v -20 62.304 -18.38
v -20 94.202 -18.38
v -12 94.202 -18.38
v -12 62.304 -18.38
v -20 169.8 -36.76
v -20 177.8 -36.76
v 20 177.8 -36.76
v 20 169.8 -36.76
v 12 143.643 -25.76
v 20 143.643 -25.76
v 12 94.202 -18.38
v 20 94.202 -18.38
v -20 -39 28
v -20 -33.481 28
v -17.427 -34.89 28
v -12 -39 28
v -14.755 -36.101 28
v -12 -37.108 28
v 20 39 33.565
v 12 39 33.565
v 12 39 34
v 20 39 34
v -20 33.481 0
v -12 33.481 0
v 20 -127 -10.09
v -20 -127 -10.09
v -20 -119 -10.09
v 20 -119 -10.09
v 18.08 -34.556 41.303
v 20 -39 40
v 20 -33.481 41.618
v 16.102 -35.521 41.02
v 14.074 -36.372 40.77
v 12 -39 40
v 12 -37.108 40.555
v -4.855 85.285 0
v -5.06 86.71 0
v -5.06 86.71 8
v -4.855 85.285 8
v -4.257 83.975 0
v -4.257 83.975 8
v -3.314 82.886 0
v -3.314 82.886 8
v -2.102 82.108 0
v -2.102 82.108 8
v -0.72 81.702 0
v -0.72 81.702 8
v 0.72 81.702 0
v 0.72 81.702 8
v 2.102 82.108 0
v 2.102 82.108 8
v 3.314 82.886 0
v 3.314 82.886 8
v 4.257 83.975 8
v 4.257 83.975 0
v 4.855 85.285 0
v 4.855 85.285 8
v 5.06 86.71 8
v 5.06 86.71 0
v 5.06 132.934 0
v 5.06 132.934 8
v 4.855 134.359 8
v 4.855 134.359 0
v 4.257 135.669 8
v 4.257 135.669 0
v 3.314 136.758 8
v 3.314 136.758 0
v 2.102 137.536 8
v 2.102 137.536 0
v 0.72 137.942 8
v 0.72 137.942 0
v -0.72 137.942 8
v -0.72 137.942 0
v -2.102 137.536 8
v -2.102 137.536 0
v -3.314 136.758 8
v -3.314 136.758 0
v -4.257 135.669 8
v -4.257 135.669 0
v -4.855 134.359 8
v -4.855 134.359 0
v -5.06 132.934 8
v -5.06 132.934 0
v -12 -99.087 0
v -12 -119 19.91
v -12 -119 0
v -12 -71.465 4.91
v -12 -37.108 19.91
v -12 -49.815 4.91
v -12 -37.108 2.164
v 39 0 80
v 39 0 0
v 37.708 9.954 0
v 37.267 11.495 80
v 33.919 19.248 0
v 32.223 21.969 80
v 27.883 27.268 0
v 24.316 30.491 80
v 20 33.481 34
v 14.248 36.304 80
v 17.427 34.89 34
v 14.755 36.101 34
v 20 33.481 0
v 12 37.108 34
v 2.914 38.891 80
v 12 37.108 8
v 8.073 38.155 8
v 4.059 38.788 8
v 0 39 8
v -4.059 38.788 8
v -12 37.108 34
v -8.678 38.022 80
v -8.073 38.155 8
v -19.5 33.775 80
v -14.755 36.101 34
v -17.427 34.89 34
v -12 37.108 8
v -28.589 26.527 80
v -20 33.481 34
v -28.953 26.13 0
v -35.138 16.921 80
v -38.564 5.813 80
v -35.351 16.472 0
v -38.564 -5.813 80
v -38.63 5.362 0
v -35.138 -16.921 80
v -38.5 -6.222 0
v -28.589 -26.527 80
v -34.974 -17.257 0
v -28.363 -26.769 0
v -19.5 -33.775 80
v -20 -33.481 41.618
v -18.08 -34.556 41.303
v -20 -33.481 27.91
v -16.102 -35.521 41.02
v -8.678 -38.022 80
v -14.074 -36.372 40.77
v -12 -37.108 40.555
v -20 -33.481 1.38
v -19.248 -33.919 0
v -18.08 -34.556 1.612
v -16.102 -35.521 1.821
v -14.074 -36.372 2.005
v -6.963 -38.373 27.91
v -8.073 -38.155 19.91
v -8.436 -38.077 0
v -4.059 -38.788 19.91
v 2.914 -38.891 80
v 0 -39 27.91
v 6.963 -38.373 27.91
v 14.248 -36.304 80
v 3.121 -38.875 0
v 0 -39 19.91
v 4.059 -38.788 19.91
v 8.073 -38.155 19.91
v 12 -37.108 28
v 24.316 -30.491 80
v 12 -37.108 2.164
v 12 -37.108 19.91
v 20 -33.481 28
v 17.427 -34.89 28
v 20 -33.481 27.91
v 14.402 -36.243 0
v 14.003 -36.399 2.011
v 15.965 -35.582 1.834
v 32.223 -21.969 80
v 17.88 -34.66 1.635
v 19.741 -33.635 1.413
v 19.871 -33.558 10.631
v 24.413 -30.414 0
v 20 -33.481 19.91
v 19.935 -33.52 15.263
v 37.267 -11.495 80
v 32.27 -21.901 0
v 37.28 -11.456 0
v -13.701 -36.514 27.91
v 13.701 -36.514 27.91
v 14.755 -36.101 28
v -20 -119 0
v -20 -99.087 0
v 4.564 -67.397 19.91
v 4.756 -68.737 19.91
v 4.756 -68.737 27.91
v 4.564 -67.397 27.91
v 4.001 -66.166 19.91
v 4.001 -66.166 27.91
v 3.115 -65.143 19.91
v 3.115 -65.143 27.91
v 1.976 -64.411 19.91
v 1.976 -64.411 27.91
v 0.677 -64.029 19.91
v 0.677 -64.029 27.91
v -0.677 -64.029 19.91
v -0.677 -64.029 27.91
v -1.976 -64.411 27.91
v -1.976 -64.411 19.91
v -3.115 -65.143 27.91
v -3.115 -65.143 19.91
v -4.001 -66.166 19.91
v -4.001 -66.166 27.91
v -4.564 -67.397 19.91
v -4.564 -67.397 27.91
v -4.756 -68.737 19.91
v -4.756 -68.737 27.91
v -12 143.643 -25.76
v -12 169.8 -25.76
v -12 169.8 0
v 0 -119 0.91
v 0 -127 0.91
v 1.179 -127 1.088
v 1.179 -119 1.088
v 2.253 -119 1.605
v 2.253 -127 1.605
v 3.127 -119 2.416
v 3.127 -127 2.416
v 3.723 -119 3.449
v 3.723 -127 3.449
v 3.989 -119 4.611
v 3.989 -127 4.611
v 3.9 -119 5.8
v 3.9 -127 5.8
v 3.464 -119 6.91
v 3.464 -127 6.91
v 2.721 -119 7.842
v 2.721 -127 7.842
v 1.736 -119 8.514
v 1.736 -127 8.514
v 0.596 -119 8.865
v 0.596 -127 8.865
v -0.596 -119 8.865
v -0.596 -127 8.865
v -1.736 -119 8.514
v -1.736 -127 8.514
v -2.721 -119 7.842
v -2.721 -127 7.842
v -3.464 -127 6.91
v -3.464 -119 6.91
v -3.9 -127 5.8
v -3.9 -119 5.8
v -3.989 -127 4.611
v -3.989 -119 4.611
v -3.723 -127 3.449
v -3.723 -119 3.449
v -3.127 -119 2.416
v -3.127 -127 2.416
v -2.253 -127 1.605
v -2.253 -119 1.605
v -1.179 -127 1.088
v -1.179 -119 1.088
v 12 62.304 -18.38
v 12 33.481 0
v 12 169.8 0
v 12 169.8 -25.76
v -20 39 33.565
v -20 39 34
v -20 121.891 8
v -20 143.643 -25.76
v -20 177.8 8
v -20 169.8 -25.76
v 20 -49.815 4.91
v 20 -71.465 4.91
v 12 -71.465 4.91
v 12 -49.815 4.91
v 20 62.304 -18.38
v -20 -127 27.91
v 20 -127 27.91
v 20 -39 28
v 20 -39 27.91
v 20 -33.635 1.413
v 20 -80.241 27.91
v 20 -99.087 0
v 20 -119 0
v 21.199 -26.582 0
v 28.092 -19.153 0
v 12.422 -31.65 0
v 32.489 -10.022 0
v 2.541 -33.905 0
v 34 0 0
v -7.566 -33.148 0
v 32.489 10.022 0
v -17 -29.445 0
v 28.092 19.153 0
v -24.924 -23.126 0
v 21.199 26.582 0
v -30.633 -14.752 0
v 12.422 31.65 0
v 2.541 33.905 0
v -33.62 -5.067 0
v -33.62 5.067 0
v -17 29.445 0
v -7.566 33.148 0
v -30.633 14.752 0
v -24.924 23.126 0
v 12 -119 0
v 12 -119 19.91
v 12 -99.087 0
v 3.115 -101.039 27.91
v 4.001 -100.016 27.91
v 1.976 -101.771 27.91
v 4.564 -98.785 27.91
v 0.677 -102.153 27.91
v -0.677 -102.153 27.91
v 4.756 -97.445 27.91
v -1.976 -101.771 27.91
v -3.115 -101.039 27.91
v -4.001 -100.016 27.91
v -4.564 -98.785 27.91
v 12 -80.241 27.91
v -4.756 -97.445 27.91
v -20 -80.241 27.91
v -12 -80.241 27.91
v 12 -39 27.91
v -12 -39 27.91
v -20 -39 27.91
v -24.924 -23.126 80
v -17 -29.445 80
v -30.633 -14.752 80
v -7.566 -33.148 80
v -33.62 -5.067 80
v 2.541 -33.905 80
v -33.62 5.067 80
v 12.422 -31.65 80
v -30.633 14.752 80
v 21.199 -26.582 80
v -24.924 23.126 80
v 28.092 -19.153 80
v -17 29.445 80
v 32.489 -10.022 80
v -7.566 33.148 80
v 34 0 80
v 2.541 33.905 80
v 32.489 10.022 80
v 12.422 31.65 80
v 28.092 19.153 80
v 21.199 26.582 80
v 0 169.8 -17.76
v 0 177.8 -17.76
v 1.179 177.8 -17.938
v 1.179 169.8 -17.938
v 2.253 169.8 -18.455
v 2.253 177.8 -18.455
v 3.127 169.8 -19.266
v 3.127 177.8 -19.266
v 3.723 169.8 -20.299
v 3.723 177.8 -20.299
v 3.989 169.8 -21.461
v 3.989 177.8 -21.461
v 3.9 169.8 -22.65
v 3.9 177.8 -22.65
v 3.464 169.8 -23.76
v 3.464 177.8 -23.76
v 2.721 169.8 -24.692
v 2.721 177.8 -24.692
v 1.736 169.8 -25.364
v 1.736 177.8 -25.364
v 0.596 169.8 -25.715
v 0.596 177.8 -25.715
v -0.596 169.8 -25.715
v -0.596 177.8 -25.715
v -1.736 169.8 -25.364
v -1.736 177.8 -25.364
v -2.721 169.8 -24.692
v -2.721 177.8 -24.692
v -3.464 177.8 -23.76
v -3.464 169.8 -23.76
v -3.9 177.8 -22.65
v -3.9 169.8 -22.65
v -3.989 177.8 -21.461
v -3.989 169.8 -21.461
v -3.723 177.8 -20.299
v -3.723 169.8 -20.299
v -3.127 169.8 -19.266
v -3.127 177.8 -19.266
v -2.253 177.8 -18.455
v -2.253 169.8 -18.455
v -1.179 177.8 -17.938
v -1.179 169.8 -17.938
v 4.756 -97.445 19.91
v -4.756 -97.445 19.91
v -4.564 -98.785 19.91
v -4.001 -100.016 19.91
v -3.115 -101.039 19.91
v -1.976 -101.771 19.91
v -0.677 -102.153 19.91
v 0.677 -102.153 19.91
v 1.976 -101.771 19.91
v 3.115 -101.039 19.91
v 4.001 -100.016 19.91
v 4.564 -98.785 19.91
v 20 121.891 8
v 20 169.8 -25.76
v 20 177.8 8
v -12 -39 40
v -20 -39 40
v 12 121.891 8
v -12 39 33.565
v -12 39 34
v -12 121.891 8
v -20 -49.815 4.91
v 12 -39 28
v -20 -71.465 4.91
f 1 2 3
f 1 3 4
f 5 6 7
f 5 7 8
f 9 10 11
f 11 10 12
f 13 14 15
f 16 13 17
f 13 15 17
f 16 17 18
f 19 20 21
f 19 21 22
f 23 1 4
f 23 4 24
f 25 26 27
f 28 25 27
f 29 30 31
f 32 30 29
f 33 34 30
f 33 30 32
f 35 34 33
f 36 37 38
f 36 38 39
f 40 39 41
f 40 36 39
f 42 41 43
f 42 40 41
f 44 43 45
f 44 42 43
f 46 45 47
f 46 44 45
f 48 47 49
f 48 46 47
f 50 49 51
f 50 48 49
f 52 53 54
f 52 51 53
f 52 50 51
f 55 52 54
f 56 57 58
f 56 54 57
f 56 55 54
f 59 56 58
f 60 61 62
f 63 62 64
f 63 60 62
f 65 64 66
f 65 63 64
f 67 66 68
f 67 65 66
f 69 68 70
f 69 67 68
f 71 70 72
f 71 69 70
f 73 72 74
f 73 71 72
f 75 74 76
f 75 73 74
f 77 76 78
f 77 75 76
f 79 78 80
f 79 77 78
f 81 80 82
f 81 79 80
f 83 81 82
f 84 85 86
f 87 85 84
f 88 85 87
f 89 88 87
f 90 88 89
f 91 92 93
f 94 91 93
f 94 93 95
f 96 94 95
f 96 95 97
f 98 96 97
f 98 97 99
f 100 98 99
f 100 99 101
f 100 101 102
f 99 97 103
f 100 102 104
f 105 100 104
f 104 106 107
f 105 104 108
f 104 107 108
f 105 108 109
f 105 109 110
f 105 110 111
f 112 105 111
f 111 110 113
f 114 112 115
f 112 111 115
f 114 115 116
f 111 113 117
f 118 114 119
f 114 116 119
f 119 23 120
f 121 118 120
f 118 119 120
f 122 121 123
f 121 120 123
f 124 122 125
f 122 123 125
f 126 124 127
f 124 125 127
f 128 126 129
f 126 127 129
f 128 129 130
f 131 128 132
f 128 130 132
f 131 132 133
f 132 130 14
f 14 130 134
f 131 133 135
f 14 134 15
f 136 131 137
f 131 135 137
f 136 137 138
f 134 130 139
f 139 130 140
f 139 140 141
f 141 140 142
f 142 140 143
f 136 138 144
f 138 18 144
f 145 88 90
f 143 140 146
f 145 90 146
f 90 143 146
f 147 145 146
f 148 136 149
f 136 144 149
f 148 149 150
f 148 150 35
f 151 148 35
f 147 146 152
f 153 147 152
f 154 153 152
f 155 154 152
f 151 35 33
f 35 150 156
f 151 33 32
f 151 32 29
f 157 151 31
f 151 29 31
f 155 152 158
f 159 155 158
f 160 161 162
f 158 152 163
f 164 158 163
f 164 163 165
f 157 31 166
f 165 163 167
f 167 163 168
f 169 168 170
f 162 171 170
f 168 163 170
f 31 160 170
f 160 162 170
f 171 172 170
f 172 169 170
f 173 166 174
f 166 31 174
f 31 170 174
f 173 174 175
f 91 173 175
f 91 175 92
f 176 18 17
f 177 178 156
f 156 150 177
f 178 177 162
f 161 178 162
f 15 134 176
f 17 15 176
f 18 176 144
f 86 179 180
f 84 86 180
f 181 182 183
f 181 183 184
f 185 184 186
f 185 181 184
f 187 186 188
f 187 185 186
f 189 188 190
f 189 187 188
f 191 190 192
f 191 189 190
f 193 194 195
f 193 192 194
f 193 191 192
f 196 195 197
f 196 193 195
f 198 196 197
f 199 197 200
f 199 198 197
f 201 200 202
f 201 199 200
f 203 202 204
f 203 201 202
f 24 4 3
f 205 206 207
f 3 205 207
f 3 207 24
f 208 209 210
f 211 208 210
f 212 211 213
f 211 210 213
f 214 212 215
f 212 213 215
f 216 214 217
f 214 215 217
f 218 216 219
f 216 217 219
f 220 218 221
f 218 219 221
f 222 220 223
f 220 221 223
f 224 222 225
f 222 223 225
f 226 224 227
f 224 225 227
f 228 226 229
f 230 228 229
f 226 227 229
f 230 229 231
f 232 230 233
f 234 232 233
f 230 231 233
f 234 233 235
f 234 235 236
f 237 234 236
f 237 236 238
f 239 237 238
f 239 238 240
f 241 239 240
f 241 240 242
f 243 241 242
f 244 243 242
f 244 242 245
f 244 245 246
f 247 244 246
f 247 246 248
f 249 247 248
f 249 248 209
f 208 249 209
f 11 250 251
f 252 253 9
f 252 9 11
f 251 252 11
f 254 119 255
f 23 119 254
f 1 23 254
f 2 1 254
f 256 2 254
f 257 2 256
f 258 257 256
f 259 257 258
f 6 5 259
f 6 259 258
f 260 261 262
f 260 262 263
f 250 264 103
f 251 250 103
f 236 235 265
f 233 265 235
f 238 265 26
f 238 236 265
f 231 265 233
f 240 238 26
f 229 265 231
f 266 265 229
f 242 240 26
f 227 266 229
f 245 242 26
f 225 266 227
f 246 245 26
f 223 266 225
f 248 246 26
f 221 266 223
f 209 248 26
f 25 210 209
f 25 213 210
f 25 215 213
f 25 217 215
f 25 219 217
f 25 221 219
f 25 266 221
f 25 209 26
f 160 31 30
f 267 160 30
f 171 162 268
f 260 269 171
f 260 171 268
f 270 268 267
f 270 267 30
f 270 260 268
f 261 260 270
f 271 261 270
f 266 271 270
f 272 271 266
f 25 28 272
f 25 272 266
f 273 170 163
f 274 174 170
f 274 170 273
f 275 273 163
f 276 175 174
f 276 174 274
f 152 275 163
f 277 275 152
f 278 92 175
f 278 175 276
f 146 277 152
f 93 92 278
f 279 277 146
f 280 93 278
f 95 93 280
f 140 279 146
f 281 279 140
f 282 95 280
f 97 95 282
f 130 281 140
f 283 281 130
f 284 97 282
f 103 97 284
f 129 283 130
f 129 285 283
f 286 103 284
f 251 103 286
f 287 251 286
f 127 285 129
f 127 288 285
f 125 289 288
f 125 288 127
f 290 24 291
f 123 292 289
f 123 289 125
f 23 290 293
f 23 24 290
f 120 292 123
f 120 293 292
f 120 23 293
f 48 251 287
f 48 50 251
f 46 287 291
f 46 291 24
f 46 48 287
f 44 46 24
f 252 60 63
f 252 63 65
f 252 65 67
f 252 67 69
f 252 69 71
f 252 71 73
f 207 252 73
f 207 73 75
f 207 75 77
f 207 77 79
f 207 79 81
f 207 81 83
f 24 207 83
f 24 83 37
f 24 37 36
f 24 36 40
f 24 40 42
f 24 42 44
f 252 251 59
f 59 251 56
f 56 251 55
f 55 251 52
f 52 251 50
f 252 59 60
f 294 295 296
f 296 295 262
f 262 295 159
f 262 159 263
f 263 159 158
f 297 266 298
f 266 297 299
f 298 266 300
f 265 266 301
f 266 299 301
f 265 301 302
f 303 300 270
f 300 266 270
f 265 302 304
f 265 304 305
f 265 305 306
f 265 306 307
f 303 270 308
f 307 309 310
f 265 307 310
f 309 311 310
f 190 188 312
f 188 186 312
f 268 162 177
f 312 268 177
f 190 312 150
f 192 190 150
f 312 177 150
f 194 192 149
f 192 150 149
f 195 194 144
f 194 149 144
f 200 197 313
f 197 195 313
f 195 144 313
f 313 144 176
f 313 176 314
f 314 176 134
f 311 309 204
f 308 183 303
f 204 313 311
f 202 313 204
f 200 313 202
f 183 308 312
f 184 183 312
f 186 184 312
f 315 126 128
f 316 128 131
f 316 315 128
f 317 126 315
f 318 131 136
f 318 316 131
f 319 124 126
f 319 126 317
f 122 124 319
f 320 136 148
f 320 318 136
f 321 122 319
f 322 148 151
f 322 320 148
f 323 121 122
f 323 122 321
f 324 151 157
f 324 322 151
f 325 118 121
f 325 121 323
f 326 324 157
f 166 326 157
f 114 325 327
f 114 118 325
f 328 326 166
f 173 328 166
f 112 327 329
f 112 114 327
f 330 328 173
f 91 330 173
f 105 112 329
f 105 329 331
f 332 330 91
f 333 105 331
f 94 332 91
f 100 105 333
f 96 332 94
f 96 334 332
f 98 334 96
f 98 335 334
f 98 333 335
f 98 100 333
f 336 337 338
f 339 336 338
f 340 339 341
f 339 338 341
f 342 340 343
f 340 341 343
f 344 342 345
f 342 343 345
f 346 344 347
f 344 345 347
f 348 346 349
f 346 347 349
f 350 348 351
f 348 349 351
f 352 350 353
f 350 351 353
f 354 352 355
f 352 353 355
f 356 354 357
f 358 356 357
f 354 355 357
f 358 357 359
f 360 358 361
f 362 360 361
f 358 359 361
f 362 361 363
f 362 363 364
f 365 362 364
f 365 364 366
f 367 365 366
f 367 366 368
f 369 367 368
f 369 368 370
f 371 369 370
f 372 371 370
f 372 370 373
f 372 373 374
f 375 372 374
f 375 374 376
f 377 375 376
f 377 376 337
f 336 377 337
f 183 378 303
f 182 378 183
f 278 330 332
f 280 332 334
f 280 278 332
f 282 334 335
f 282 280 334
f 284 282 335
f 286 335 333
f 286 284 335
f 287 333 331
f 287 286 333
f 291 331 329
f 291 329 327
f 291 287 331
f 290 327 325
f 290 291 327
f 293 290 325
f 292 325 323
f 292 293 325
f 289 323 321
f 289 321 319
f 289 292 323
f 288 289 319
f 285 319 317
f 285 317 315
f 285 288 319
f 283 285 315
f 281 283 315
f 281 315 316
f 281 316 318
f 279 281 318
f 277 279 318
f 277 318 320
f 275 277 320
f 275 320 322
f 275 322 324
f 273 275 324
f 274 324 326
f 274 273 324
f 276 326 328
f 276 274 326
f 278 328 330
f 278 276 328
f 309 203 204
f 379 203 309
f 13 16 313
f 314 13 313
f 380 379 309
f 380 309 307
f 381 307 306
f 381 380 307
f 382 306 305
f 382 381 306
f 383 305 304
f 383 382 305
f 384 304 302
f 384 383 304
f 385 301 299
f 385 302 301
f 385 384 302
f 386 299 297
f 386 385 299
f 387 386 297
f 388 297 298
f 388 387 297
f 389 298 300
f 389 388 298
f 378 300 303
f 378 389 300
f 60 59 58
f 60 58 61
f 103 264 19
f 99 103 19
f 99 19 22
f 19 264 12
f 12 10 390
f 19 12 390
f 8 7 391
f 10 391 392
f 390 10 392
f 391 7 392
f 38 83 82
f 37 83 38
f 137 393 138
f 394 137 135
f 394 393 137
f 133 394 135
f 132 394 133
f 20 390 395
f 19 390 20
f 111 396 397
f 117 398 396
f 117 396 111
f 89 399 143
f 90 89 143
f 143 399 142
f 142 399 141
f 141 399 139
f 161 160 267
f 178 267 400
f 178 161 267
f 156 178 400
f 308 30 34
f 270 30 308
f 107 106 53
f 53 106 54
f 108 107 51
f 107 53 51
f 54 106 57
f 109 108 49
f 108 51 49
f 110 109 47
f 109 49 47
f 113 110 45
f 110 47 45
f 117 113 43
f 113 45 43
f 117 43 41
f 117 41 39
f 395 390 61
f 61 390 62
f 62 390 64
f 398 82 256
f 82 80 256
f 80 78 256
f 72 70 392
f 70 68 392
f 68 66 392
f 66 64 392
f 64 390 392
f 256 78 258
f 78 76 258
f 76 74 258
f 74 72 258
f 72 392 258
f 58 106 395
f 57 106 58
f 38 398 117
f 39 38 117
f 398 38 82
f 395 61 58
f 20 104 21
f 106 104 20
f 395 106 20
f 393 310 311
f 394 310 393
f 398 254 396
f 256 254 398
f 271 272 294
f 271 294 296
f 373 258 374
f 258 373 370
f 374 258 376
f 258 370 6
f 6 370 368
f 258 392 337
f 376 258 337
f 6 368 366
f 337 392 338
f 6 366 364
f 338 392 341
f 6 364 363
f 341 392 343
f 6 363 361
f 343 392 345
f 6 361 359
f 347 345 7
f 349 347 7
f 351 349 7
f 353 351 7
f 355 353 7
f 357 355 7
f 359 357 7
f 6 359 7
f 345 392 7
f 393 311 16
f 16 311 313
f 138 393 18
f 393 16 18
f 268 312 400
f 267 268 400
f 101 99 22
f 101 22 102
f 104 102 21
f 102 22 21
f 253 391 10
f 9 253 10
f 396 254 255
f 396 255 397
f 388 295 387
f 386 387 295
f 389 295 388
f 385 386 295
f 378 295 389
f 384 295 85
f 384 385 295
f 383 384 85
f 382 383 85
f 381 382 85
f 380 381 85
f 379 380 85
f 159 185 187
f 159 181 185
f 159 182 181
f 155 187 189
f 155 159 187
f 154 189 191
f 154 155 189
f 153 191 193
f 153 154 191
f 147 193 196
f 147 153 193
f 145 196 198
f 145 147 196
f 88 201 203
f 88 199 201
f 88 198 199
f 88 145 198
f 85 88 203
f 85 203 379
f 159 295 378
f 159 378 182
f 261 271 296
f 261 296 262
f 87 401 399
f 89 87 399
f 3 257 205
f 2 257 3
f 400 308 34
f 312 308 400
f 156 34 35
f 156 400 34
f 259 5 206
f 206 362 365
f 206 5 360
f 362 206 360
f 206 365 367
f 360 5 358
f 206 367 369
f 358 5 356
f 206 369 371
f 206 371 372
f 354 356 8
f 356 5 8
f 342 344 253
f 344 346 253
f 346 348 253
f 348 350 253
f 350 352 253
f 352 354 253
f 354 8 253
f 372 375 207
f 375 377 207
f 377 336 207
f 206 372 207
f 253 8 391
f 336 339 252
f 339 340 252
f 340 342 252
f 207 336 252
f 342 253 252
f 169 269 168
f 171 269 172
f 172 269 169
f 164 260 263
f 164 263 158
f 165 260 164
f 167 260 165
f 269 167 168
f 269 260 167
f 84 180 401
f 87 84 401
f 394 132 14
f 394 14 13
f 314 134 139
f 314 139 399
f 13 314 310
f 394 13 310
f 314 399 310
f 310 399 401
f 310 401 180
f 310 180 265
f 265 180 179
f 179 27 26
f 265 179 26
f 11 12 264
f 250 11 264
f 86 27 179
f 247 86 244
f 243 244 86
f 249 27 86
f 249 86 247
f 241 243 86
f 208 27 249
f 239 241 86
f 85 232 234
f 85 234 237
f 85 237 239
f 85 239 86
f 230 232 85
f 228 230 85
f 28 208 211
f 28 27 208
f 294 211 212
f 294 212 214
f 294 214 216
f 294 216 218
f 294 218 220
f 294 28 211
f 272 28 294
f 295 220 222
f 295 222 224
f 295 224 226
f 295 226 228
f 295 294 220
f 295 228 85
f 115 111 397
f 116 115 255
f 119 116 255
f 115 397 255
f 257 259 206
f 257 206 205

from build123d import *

# Parameters (mm, degrees)
SKETCH1_R            = 39
SKETCH1_R_2          = 34
BOSS_EXTRUDE1_DEPTH  = 80
BOSS_EXTRUDE2_DEPTH  = 20
BOSS_EXTRUDE3_DEPTH  = 20
BOSS_EXTRUDE4_DEPTH  = 8
BOSS_EXTRUDE5_DEPTH  = 8
CUT_EXTRUDE1_DEPTH   = 73
SKETCH13_R           = 4
CUT_EXTRUDE2_DEPTH   = 24
SKETCH14_R           = 4
CUT_EXTRUDE3_DEPTH   = 24
BOSS_EXTRUDE6_DEPTH  = 8
BOSS_EXTRUDE7_DEPTH  = 8
BOSS_EXTRUDE8_DEPTH  = 8
BOSS_EXTRUDE14_DEPTH = 8
BOSS_EXTRUDE15_DEPTH = 8
BOSS_EXTRUDE16_DEPTH = 8
BOSS_EXTRUDE17_DEPTH = 8
BOSS_EXTRUDE18_DEPTH = 26
BOSS_EXTRUDE19_REACH = 195.204


with BuildPart() as part:
    # Sketch1 → Boss-Extrude1 (new body)
    with BuildSketch(Plane.XY):
        Circle(SKETCH1_R)
        Circle(SKETCH1_R_2, mode=Mode.SUBTRACT)
    extrude(amount=BOSS_EXTRUDE1_DEPTH)



with BuildPart() as body_2:
    # Sketch3 → Boss-Extrude2 (new, symmetric)
    with BuildSketch(Plane(origin=(0, 0, 0), x_dir=(0, 0, -1), z_dir=(1, 0, 0))):
        Polygon((-8, 39), (-8, 177.8), (36.76, 177.8), (36.76, 169.8), (0, 169.8), (0, 39), align=None)
    extrude(amount=BOSS_EXTRUDE2_DEPTH, both=True)


with BuildPart() as body_3:
    # Sketch4 → Boss-Extrude3 (new, symmetric)
    with BuildSketch(Plane(origin=(0, 0, 0), x_dir=(0, 0, -1), z_dir=(1, 0, 0))):
        Polygon((-27.91, -39), (-27.91, -127), (10.09, -127), (10.09, -119), (-19.91, -119), (-19.91, -39), align=None)
    extrude(amount=BOSS_EXTRUDE3_DEPTH, both=True)


with BuildPart() as part_1:
    add(part.part)

    add(body_3.part)  # Boss-Extrude4 merges body 3
    # Sketch6 → Boss-Extrude4 (add)
    with BuildSketch(Plane(origin=(0, 0, 19.91), x_dir=(-1, 0, 0), z_dir=(0, 0, -1))):
        with BuildLine():
            ThreePointArc((20, -33.481338086), (10.373712322, -37.595027499), (0, -39))
            Line((0, -39), (20, -39))
            Line((20, -39), (20, -33.481338086))
        make_face()
        with BuildLine():
            Line((-20, -33.481338086), (-20, -39))
            Line((-20, -39), (0, -39))
            ThreePointArc((0, -39), (-10.373712322, -37.595027499), (-20, -33.481338086))
        make_face()
    extrude(amount=-BOSS_EXTRUDE4_DEPTH)


    add(body_2.part)  # Boss-Extrude5 merges body 2
    # Sketch7 → Boss-Extrude5 (add)
    with BuildSketch(Plane(origin=(0, 0, 0), x_dir=(-1, 0, 0), z_dir=(0, 0, -1))):
        with BuildLine():
            Line((0, 39), (-20, 39))
            Line((-20, 39), (-20, 33.481338086))
            ThreePointArc((-20, 33.481338086), (-10.373712322, 37.595027499), (0, 39))
        make_face()
        with BuildLine():
            Line((20, 39), (0, 39))
            ThreePointArc((0, 39), (10.373712322, 37.595027499), (20, 33.481338086))
            Line((20, 33.481338086), (20, 39))
        make_face()
    extrude(amount=-BOSS_EXTRUDE5_DEPTH)

    # Sketch12 → Cut-Extrude1 (cut)
    with BuildSketch(Plane(origin=(0, 0, 0), x_dir=(-1, 0, 0), z_dir=(0, 0, -1))):
        with BuildLine():
            Line((5.059933618, 132.933679622), (5.059933618, 86.710392146))
            ThreePointArc((5.059933618, 86.710392146), (0, 81.650458528), (-5.059933618, 86.710392146))
            Line((-5.059933618, 86.710392146), (-5.059933618, 132.933679622))
            ThreePointArc((-5.059933618, 132.933679622), (0, 137.993613239), (5.059933618, 132.933679622))
        make_face()
        with BuildLine():
            Line((4.756389645, -68.737317272), (4.756389645, -97.444530968))
            ThreePointArc((4.756389645, -97.444530968), (0, -102.200920613), (-4.756389645, -97.444530968))
            Line((-4.756389645, -97.444530968), (-4.756389645, -68.737317272))
            ThreePointArc((-4.756389645, -68.737317272), (0, -63.980927627), (4.756389645, -68.737317272))
        make_face()
    extrude(amount=-CUT_EXTRUDE1_DEPTH, mode=Mode.SUBTRACT)

    # Sketch13 → Cut-Extrude2 (cut)
    with BuildSketch(Plane(origin=(0, 177.8, 0), x_dir=(1, 0, 0), z_dir=(0, 1, 0))):
        with Locations(Location((0, 21.76, 0), (0, 0, 270))):
            Circle(SKETCH13_R)
    extrude(amount=-CUT_EXTRUDE2_DEPTH, mode=Mode.SUBTRACT)

    # Sketch14 → Cut-Extrude3 (cut)
    with BuildSketch(Plane.XZ.offset(127)):
        with Locations(Location((0, 4.91, 0), (0, 0, 270))):
            Circle(SKETCH14_R)
    extrude(amount=-CUT_EXTRUDE3_DEPTH, mode=Mode.SUBTRACT)

    # Sketch15 → Boss-Extrude6 (add)
    with BuildSketch(Plane(origin=(20, 0, 0), x_dir=(0, 0, -1), z_dir=(1, 0, 0))):
        Polygon((0, -119), (0, -99.086888853), (-4.91, -71.464610667), (-4.91, -49.814716953), (-1.4130197, -33.634678949), (-19.91, -33.481338086), (-19.91, -119), align=None)
    extrude(amount=-BOSS_EXTRUDE6_DEPTH)

    # Sketch16 → Boss-Extrude7 (add)
    with BuildSketch(Plane.ZY.offset(20)):
        Polygon((0, -119), (0, -99.086888853), (4.91, -71.464610667), (4.91, -49.814716953), (1.379878246, -33.481338086), (19.91, -33.481338086), (19.91, -119), align=None)
    extrude(amount=-BOSS_EXTRUDE7_DEPTH)

    # Sketch17 → Boss-Extrude8 (add)
    with BuildSketch(Plane(origin=(20, 0, 0), x_dir=(0, 0, -1), z_dir=(1, 0, 0))):
        Polygon((25.76, 169.8), (25.76, 143.643001818), (18.38, 94.201688411), (18.38, 62.304066859), (0, 33.481338086), (0, 169.8), align=None)
    extrude(amount=-BOSS_EXTRUDE8_DEPTH)

    # Sketch23 → Boss-Extrude14 (add)
    with BuildSketch(Plane(origin=(20, 0, 0), x_dir=(0, 0, -1), z_dir=(1, 0, 0))):
        Polygon((-8, 121.891336637), (-33.564768945, 39), (-8, 39), align=None)
        Polygon((-40, -39), (-27.91, -80.240669043), (-27.91, -39), align=None)
    extrude(amount=-BOSS_EXTRUDE14_DEPTH)

    # Sketch24 → Boss-Extrude15 (add)
    with BuildSketch(Plane.ZY.offset(20)):
        Polygon((0, 169.8), (-25.76, 169.8), (-25.76, 143.643001818), (-18.38, 94.201688411), (-18.38, 62.304066859), (0, 33.481338086), align=None)
    extrude(amount=-BOSS_EXTRUDE15_DEPTH)

    # Sketch25 → Boss-Extrude16 (add)
    with BuildSketch(Plane.ZY.offset(20)):
        Polygon((8, 39), (33.564768945, 39), (8, 121.891336637), align=None)
    extrude(amount=-BOSS_EXTRUDE16_DEPTH)

    # Sketch26 → Boss-Extrude17 (add)
    with BuildSketch(Plane.ZY.offset(20)):
        Polygon((27.91, -39), (27.91, -80.240669043), (40, -39), align=None)
    extrude(amount=-BOSS_EXTRUDE17_DEPTH)

    # Sketch28 → Boss-Extrude18 (add)
    with BuildSketch(Plane.XY.offset(8)):
        with BuildLine():
            ThreePointArc((-12, 37.107950631), (-16.102424651, 35.52058446), (-20, 33.481338086))
            Line((-20, 33.481338086), (-20, 39))
            Line((-20, 39), (-12, 39))
            Line((-12, 39), (-12, 37.107950631))
        make_face()
        with BuildLine():
            ThreePointArc((20, 33.481338086), (16.102424651, 35.52058446), (12, 37.107950631))
            Line((12, 37.107950631), (12, 39))
            Line((12, 39), (20, 39))
            Line((20, 39), (20, 33.481338086))
        make_face()
    extrude(amount=BOSS_EXTRUDE18_DEPTH)

    # Boss-Extrude19: up to this plane
    boss_extrude19_end = Plane(origin=(-12, -80.240669043, 27.91), z_dir=(0, -0.2813179552300577, 0.9596146143453523))
    # Sketch29 → Boss-Extrude19 (add, up to the surface)
    with BuildSketch(Plane.XY.offset(28), mode=Mode.PRIVATE) as boss_extrude19_sk1:
        with BuildLine():
            Line((-12, -39), (-12, -37.107950631))
            ThreePointArc((-12, -37.107950631), (-16.102424651, -35.52058446), (-20, -33.481338086))
            Line((-20, -33.481338086), (-20, -39))
            Line((-20, -39), (-12, -39))
        make_face()
    boss_extrude19_tool1 = split(extrude(boss_extrude19_sk1.sketch, amount=BOSS_EXTRUDE19_REACH, mode=Mode.PRIVATE), bisect_by=boss_extrude19_end, keep=Keep.BOTH, mode=Mode.PRIVATE)
    add(boss_extrude19_tool1.solids().sort_by_distance((-16.684032, -37.08267, 28))[0])
    # Sketch29 → Boss-Extrude19 (add, up to the surface)
    with BuildSketch(Plane.XY.offset(28), mode=Mode.PRIVATE) as boss_extrude19_sk2:
        with BuildLine():
            Line((12, -39), (12, -37.107950631))
            ThreePointArc((12, -37.107950631), (16.102424651, -35.52058446), (20, -33.481338086))
            Line((20, -33.481338086), (20, -39))
            Line((20, -39), (12, -39))
        make_face()
    boss_extrude19_tool2 = split(extrude(boss_extrude19_sk2.sketch, amount=BOSS_EXTRUDE19_REACH, mode=Mode.PRIVATE), bisect_by=boss_extrude19_end, keep=Keep.BOTH, mode=Mode.PRIVATE)
    add(boss_extrude19_tool2.solids().sort_by_distance((16.684032, -37.08267, 28))[0])


solid = part_1.part
